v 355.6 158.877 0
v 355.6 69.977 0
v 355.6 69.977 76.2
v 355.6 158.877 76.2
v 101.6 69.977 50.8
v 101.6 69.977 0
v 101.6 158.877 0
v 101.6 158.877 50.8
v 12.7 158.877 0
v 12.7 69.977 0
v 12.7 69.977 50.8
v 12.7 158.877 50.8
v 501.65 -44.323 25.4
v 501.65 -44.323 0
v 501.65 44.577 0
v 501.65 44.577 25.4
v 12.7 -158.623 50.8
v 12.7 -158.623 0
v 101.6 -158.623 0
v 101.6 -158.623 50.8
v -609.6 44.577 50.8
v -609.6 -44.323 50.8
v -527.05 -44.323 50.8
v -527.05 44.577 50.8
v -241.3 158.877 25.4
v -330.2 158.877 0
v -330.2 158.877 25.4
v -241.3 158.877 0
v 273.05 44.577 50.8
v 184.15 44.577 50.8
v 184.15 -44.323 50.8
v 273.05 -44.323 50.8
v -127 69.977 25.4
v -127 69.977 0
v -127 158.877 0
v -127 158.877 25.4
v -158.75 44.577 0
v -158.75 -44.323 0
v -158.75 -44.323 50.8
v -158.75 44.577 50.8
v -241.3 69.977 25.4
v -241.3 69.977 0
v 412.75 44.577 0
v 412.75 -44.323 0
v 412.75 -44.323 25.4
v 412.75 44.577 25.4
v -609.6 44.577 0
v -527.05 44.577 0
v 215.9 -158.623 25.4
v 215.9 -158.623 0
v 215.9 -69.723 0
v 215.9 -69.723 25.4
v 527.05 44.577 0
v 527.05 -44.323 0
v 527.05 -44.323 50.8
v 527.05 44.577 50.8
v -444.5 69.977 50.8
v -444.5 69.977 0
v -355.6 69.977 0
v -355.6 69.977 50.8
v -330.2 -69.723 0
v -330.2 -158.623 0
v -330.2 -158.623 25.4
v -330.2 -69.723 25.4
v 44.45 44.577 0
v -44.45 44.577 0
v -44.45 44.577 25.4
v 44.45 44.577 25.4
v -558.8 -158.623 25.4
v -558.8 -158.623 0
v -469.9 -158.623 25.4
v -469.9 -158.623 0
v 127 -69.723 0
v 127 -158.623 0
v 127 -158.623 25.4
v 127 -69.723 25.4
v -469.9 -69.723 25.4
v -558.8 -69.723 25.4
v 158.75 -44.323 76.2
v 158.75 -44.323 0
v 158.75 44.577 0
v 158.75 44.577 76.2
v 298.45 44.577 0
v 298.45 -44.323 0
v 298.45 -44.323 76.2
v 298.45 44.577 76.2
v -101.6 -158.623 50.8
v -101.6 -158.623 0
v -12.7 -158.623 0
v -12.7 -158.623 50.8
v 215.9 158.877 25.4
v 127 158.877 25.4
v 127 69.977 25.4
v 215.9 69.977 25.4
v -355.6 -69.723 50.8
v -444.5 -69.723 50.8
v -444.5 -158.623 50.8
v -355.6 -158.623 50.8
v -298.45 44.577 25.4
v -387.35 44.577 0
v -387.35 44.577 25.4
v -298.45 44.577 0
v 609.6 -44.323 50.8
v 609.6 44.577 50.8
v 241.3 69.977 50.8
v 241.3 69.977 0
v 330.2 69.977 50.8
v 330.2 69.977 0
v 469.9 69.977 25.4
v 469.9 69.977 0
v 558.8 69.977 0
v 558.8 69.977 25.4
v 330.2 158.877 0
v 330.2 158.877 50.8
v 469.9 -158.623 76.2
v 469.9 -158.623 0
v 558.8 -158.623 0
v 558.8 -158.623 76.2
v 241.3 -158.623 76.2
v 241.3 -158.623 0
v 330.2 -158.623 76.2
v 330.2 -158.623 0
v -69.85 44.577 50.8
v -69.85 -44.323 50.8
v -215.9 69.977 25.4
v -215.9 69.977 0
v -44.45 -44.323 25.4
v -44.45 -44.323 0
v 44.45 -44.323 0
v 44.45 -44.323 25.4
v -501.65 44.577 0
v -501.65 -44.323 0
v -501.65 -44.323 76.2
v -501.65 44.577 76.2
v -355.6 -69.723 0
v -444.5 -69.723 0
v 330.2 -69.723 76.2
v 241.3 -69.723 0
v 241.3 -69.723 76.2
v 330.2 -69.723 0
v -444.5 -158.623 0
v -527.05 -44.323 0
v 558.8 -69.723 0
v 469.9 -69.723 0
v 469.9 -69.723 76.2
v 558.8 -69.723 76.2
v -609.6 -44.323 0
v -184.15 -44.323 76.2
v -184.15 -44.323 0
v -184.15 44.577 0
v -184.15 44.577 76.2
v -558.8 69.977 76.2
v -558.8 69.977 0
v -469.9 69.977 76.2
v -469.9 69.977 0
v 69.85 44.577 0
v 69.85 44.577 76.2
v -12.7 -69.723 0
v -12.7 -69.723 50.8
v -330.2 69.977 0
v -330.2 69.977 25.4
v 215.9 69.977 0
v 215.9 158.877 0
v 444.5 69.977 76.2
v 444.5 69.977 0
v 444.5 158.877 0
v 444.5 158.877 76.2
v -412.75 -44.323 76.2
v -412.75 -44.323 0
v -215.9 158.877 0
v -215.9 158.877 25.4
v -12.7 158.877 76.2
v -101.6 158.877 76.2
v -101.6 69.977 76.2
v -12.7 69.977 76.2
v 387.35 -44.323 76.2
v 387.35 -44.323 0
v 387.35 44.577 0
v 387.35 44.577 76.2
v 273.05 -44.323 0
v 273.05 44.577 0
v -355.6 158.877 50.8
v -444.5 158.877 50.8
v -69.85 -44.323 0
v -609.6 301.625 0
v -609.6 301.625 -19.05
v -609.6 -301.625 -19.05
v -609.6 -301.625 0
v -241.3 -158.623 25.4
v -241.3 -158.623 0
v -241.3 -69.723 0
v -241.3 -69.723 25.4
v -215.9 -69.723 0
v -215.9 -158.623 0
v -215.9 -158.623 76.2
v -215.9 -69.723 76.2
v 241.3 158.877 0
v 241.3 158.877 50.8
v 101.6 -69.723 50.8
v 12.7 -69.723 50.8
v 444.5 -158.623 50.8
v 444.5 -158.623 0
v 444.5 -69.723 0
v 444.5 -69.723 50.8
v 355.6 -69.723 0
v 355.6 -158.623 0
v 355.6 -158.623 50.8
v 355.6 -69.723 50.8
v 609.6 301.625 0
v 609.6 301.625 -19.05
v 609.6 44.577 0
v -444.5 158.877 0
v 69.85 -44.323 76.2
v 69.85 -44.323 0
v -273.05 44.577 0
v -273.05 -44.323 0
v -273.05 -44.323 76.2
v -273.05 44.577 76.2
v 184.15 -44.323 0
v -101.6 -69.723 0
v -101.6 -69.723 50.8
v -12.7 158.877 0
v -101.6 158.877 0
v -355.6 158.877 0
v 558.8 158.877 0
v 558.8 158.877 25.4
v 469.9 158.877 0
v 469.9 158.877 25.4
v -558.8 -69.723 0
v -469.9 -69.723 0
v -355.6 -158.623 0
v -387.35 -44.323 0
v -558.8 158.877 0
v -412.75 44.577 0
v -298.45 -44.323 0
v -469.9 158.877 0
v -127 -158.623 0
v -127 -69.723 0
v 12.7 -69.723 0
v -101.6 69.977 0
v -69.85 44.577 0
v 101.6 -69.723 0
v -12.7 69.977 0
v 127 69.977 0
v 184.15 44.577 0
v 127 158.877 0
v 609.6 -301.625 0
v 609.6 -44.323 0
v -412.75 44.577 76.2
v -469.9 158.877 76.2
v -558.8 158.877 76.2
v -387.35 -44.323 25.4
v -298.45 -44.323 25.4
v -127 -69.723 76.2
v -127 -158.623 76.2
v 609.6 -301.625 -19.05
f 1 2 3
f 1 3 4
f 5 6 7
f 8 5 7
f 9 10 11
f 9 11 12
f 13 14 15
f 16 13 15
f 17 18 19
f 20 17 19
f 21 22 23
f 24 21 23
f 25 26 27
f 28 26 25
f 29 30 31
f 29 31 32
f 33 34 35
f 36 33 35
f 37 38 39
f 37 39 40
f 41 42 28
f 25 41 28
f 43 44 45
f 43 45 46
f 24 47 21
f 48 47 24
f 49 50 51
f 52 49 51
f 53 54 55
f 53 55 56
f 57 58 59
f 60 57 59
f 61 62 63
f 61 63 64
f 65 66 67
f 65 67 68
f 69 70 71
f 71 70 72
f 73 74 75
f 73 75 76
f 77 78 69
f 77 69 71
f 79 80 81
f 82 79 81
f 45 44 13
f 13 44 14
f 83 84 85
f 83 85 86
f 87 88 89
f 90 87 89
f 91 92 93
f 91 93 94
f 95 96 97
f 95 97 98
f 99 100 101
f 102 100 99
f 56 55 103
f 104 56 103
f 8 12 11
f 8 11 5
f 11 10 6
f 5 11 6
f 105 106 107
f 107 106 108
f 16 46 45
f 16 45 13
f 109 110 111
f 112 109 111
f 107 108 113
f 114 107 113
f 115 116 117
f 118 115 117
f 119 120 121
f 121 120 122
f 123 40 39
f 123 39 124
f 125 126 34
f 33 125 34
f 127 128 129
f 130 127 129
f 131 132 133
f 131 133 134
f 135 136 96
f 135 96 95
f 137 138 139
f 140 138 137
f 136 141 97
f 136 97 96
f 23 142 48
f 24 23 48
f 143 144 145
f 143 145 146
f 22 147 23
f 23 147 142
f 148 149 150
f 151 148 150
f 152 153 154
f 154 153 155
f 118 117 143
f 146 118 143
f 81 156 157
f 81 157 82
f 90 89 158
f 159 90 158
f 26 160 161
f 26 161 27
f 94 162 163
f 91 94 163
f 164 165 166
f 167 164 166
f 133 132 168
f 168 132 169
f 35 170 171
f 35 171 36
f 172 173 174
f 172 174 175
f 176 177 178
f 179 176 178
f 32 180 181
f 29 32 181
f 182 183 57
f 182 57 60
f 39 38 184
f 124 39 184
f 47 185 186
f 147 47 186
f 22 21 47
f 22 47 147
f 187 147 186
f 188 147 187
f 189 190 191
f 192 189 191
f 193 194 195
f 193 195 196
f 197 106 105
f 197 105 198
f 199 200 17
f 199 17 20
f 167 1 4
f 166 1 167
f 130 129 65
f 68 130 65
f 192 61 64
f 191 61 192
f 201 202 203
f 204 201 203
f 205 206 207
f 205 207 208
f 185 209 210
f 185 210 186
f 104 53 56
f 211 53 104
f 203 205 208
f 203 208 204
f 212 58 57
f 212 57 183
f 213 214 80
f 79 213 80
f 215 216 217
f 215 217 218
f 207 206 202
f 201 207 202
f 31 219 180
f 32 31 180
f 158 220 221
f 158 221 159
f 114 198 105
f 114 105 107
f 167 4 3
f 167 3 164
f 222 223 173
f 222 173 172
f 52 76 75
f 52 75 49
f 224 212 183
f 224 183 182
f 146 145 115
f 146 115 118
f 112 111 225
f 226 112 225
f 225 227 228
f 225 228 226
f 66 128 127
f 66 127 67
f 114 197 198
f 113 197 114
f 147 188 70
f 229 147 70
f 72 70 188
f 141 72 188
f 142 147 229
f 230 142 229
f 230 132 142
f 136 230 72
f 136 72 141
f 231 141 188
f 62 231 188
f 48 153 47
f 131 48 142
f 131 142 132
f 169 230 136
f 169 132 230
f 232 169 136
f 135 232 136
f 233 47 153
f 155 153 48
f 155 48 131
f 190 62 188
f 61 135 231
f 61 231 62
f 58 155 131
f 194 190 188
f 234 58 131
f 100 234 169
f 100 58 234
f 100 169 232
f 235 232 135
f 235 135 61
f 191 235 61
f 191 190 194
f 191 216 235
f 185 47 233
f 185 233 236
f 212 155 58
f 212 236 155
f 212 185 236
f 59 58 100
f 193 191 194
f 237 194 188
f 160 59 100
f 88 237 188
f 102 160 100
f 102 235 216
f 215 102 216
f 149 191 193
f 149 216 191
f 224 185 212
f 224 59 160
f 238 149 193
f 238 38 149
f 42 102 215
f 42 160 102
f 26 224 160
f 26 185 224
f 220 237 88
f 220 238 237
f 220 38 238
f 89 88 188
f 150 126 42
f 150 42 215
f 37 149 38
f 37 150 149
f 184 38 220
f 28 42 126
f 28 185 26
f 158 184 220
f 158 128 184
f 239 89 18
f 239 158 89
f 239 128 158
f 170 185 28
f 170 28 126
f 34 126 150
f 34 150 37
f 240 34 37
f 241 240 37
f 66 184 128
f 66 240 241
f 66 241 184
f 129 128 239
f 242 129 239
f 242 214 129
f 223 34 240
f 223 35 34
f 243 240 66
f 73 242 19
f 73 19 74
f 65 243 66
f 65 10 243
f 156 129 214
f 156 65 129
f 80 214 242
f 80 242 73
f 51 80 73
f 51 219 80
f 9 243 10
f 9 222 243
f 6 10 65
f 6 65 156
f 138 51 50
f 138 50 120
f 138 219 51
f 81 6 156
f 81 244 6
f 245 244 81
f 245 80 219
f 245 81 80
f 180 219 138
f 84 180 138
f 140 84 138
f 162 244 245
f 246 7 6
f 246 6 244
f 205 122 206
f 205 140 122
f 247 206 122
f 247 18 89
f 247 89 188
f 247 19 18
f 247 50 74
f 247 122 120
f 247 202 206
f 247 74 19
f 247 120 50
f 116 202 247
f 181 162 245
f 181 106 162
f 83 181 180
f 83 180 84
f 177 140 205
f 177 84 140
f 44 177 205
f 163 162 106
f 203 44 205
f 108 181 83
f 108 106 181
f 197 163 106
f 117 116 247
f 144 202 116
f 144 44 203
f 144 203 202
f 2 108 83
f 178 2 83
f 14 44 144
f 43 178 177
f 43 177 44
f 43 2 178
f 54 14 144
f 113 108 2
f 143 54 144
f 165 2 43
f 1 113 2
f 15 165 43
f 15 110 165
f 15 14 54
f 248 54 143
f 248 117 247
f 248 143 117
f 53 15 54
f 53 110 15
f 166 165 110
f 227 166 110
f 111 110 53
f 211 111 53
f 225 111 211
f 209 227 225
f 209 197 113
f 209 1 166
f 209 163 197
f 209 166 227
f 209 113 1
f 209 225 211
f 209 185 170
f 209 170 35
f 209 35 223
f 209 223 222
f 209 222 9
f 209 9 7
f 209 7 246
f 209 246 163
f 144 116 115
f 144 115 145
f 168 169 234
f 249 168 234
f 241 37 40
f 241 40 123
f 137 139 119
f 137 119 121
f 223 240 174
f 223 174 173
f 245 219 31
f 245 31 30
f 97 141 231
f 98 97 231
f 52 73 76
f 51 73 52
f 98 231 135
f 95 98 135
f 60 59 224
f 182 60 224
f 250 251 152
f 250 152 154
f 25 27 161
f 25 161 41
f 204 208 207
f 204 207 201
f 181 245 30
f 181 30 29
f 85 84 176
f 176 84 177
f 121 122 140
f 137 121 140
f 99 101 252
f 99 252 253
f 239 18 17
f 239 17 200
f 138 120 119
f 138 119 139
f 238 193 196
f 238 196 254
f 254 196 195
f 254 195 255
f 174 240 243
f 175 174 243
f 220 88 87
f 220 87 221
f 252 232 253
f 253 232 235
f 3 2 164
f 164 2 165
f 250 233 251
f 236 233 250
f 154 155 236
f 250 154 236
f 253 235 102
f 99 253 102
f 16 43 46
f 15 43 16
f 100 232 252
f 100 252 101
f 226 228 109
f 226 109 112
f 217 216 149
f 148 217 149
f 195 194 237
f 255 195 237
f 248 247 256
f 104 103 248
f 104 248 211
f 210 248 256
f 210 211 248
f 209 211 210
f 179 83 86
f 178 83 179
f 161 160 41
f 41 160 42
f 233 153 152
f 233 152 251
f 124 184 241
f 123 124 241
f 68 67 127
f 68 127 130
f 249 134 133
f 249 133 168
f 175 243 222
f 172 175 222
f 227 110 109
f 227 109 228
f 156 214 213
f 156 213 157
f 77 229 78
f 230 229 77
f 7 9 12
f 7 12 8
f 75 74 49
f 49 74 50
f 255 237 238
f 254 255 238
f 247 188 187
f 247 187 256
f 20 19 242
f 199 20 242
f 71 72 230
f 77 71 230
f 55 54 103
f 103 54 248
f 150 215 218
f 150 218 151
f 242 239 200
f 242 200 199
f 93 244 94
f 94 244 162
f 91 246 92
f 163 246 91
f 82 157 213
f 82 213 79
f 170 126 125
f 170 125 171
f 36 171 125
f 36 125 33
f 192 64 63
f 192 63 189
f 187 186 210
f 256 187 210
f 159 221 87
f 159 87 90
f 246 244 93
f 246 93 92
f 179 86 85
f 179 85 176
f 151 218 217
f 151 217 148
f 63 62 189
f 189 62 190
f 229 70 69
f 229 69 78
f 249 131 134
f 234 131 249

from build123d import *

# Parameters (mm, degrees)
F0_W     = 88.9
F0_H     = 88.9
F0_W_2   = 82.55
F1_DEPTH = 19.05
F2_DEPTH = 25.4
F3_DEPTH = 76.2
F4_DEPTH = 50.8


with BuildPart() as f1:
    # F0 (on Top) → F1 (new body)
    with BuildSketch(Plane.XY):
        Polygon((609.6, 301.625), (-609.6, 301.625), (-609.6, 44.577), (-527.05, 44.577), (-527.05, -44.323), (-609.6, -44.323), (-609.6, -301.625), (609.6, -301.625), (609.6, -44.323), (527.05, -44.323), (527.05, 44.577), (609.6, 44.577), align=None)
        with Locations((-514.35, -114.173)):
            Rectangle(F0_W, F0_H, mode=Mode.SUBTRACT)
        with Locations((-400.05, -114.173)):
            Rectangle(F0_W, F0_H, mode=Mode.SUBTRACT)
        with Locations((-285.75, -114.173)):
            Rectangle(F0_W, F0_H, mode=Mode.SUBTRACT)
        with Locations((-171.45, -114.173)):
            Rectangle(F0_W, F0_H, mode=Mode.SUBTRACT)
        with Locations((-57.15, -114.173)):
            Rectangle(F0_W, F0_H, mode=Mode.SUBTRACT)
        with Locations((57.15, -114.173)):
            Rectangle(F0_W, F0_H, mode=Mode.SUBTRACT)
        with Locations((171.45, -114.173)):
            Rectangle(F0_W, F0_H, mode=Mode.SUBTRACT)
        with Locations((285.75, -114.173)):
            Rectangle(F0_W, F0_H, mode=Mode.SUBTRACT)
        with Locations((400.05, -114.173)):
            Rectangle(F0_W, F0_H, mode=Mode.SUBTRACT)
        with Locations((514.35, -114.173)):
            Rectangle(F0_W, F0_H, mode=Mode.SUBTRACT)
        with Locations((-457.2, 0.127)):
            Rectangle(F0_W, F0_H, mode=Mode.SUBTRACT)
        with Locations((-342.9, 0.127)):
            Rectangle(F0_W, F0_H, mode=Mode.SUBTRACT)
        with Locations((-514.35, 114.427)):
            Rectangle(F0_W, F0_H, mode=Mode.SUBTRACT)
        with Locations((-400.05, 114.427)):
            Rectangle(F0_W, F0_H, mode=Mode.SUBTRACT)
        with Locations((-228.6, 0.127)):
            Rectangle(F0_W, F0_H, mode=Mode.SUBTRACT)
        with Locations((-114.3, 0.127)):
            Rectangle(F0_W, F0_H, mode=Mode.SUBTRACT)
        with Locations((-285.75, 114.427)):
            Rectangle(F0_W, F0_H, mode=Mode.SUBTRACT)
        with Locations((-171.45, 114.427)):
            Rectangle(F0_W, F0_H, mode=Mode.SUBTRACT)
        with Locations((-57.15, 114.427)):
            Rectangle(F0_W, F0_H, mode=Mode.SUBTRACT)
        with Locations((0, 0.127)):
            Rectangle(F0_W, F0_H, mode=Mode.SUBTRACT)
        with Locations((114.3, 0.127)):
            Rectangle(F0_W, F0_H, mode=Mode.SUBTRACT)
        with Locations((228.6, 0.127)):
            Rectangle(F0_W, F0_H, mode=Mode.SUBTRACT)
        with Locations((57.15, 114.427)):
            Rectangle(F0_W, F0_H, mode=Mode.SUBTRACT)
        with Locations((171.45, 114.427)):
            Rectangle(F0_W, F0_H, mode=Mode.SUBTRACT)
        with Locations((285.75, 114.427)):
            Rectangle(F0_W, F0_H, mode=Mode.SUBTRACT)
        with Locations((342.9, 0.127)):
            Rectangle(F0_W, F0_H, mode=Mode.SUBTRACT)
        with Locations((457.2, 0.127)):
            Rectangle(F0_W, F0_H, mode=Mode.SUBTRACT)
        with Locations((400.05, 114.427)):
            Rectangle(F0_W, F0_H, mode=Mode.SUBTRACT)
        with Locations((514.35, 114.427)):
            Rectangle(F0_W, F0_H, mode=Mode.SUBTRACT)
        with Locations((-400.05, -114.173)):
            Rectangle(F0_W, F0_H)
        with Locations((-514.35, -114.173)):
            Rectangle(F0_W, F0_H)
        with Locations((-457.2, 0.127)):
            Rectangle(F0_W, F0_H)
        with Locations((-514.35, 114.427)):
            Rectangle(F0_W, F0_H)
        with Locations((-400.05, 114.427)):
            Rectangle(F0_W, F0_H)
        with Locations((-342.9, 0.127)):
            Rectangle(F0_W, F0_H)
        with Locations((-285.75, -114.173)):
            Rectangle(F0_W, F0_H)
        with Locations((-171.45, -114.173)):
            Rectangle(F0_W, F0_H)
        with Locations((-228.6, 0.127)):
            Rectangle(F0_W, F0_H)
        with Locations((-285.75, 114.427)):
            Rectangle(F0_W, F0_H)
        with Locations((-171.45, 114.427)):
            Rectangle(F0_W, F0_H)
        with Locations((-114.3, 0.127)):
            Rectangle(F0_W, F0_H)
        with Locations((-57.15, -114.173)):
            Rectangle(F0_W, F0_H)
        with Locations((57.15, -114.173)):
            Rectangle(F0_W, F0_H)
        with Locations((0, 0.127)):
            Rectangle(F0_W, F0_H)
        with Locations((-57.15, 114.427)):
            Rectangle(F0_W, F0_H)
        with Locations((57.15, 114.427)):
            Rectangle(F0_W, F0_H)
        with Locations((114.3, 0.127)):
            Rectangle(F0_W, F0_H)
        with Locations((171.45, -114.173)):
            Rectangle(F0_W, F0_H)
        with Locations((285.75, -114.173)):
            Rectangle(F0_W, F0_H)
        with Locations((228.6, 0.127)):
            Rectangle(F0_W, F0_H)
        with Locations((171.45, 114.427)):
            Rectangle(F0_W, F0_H)
        with Locations((342.9, 0.127)):
            Rectangle(F0_W, F0_H)
        with Locations((400.05, -114.173)):
            Rectangle(F0_W, F0_H)
        with Locations((285.75, 114.427)):
            Rectangle(F0_W, F0_H)
        with Locations((400.05, 114.427)):
            Rectangle(F0_W, F0_H)
        with Locations((457.2, 0.127)):
            Rectangle(F0_W, F0_H)
        with Locations((514.35, -114.173)):
            Rectangle(F0_W, F0_H)
        with Locations((514.35, 114.427)):
            Rectangle(F0_W, F0_H)
        with Locations((-568.325, 0.127)):
            Rectangle(F0_W_2, F0_H)
        with Locations((568.325, 0.127)):
            Rectangle(F0_W_2, F0_H)
    extrude(amount=-F1_DEPTH)

    # F0 (on Top) → F2 (join)
    with BuildSketch(Plane.XY):
        with Locations((514.35, 114.427)):
            Rectangle(F0_W, F0_H)
        with Locations((457.2, 0.127)):
            Rectangle(F0_W, F0_H)
        with Locations((171.45, -114.173)):
            Rectangle(F0_W, F0_H)
        with Locations((-514.35, -114.173)):
            Rectangle(F0_W, F0_H)
        with Locations((-342.9, 0.127)):
            Rectangle(F0_W, F0_H)
        with Locations((-285.75, -114.173)):
            Rectangle(F0_W, F0_H)
        with Locations((0, 0.127)):
            Rectangle(F0_W, F0_H)
        with Locations((171.45, 114.427)):
            Rectangle(F0_W, F0_H)
        with Locations((-285.75, 114.427)):
            Rectangle(F0_W, F0_H)
        with Locations((-171.45, 114.427)):
            Rectangle(F0_W, F0_H)
    extrude(amount=F2_DEPTH)

    # F0 (on Top) → F3 (join)
    with BuildSketch(Plane.XY):
        with Locations((514.35, -114.173)):
            Rectangle(F0_W, F0_H)
        with Locations((400.05, 114.427)):
            Rectangle(F0_W, F0_H)
        with Locations((342.9, 0.127)):
            Rectangle(F0_W, F0_H)
        with Locations((114.3, 0.127)):
            Rectangle(F0_W, F0_H)
        with Locations((-228.6, 0.127)):
            Rectangle(F0_W, F0_H)
        with Locations((-457.2, 0.127)):
            Rectangle(F0_W, F0_H)
        with Locations((285.75, -114.173)):
            Rectangle(F0_W, F0_H)
        with Locations((-171.45, -114.173)):
            Rectangle(F0_W, F0_H)
        with Locations((-514.35, 114.427)):
            Rectangle(F0_W, F0_H)
        with Locations((-57.15, 114.427)):
            Rectangle(F0_W, F0_H)
    extrude(amount=F3_DEPTH)

    # F0 (on Top) → F4 (join)
    with BuildSketch(Plane.XY):
        with Locations((-568.325, 0.127)):
            Rectangle(F0_W_2, F0_H)
        with Locations((-400.05, -114.173)):
            Rectangle(F0_W, F0_H)
        with Locations((-400.05, 114.427)):
            Rectangle(F0_W, F0_H)
        with Locations((57.15, 114.427)):
            Rectangle(F0_W, F0_H)
        with Locations((-114.3, 0.127)):
            Rectangle(F0_W, F0_H)
        with Locations((-57.15, -114.173)):
            Rectangle(F0_W, F0_H)
        with Locations((57.15, -114.173)):
            Rectangle(F0_W, F0_H)
        with Locations((228.6, 0.127)):
            Rectangle(F0_W, F0_H)
        with Locations((285.75, 114.427)):
            Rectangle(F0_W, F0_H)
        with Locations((400.05, -114.173)):
            Rectangle(F0_W, F0_H)
        with Locations((568.325, 0.127)):
            Rectangle(F0_W_2, F0_H)
    extrude(amount=F4_DEPTH)


solid = f1.part
